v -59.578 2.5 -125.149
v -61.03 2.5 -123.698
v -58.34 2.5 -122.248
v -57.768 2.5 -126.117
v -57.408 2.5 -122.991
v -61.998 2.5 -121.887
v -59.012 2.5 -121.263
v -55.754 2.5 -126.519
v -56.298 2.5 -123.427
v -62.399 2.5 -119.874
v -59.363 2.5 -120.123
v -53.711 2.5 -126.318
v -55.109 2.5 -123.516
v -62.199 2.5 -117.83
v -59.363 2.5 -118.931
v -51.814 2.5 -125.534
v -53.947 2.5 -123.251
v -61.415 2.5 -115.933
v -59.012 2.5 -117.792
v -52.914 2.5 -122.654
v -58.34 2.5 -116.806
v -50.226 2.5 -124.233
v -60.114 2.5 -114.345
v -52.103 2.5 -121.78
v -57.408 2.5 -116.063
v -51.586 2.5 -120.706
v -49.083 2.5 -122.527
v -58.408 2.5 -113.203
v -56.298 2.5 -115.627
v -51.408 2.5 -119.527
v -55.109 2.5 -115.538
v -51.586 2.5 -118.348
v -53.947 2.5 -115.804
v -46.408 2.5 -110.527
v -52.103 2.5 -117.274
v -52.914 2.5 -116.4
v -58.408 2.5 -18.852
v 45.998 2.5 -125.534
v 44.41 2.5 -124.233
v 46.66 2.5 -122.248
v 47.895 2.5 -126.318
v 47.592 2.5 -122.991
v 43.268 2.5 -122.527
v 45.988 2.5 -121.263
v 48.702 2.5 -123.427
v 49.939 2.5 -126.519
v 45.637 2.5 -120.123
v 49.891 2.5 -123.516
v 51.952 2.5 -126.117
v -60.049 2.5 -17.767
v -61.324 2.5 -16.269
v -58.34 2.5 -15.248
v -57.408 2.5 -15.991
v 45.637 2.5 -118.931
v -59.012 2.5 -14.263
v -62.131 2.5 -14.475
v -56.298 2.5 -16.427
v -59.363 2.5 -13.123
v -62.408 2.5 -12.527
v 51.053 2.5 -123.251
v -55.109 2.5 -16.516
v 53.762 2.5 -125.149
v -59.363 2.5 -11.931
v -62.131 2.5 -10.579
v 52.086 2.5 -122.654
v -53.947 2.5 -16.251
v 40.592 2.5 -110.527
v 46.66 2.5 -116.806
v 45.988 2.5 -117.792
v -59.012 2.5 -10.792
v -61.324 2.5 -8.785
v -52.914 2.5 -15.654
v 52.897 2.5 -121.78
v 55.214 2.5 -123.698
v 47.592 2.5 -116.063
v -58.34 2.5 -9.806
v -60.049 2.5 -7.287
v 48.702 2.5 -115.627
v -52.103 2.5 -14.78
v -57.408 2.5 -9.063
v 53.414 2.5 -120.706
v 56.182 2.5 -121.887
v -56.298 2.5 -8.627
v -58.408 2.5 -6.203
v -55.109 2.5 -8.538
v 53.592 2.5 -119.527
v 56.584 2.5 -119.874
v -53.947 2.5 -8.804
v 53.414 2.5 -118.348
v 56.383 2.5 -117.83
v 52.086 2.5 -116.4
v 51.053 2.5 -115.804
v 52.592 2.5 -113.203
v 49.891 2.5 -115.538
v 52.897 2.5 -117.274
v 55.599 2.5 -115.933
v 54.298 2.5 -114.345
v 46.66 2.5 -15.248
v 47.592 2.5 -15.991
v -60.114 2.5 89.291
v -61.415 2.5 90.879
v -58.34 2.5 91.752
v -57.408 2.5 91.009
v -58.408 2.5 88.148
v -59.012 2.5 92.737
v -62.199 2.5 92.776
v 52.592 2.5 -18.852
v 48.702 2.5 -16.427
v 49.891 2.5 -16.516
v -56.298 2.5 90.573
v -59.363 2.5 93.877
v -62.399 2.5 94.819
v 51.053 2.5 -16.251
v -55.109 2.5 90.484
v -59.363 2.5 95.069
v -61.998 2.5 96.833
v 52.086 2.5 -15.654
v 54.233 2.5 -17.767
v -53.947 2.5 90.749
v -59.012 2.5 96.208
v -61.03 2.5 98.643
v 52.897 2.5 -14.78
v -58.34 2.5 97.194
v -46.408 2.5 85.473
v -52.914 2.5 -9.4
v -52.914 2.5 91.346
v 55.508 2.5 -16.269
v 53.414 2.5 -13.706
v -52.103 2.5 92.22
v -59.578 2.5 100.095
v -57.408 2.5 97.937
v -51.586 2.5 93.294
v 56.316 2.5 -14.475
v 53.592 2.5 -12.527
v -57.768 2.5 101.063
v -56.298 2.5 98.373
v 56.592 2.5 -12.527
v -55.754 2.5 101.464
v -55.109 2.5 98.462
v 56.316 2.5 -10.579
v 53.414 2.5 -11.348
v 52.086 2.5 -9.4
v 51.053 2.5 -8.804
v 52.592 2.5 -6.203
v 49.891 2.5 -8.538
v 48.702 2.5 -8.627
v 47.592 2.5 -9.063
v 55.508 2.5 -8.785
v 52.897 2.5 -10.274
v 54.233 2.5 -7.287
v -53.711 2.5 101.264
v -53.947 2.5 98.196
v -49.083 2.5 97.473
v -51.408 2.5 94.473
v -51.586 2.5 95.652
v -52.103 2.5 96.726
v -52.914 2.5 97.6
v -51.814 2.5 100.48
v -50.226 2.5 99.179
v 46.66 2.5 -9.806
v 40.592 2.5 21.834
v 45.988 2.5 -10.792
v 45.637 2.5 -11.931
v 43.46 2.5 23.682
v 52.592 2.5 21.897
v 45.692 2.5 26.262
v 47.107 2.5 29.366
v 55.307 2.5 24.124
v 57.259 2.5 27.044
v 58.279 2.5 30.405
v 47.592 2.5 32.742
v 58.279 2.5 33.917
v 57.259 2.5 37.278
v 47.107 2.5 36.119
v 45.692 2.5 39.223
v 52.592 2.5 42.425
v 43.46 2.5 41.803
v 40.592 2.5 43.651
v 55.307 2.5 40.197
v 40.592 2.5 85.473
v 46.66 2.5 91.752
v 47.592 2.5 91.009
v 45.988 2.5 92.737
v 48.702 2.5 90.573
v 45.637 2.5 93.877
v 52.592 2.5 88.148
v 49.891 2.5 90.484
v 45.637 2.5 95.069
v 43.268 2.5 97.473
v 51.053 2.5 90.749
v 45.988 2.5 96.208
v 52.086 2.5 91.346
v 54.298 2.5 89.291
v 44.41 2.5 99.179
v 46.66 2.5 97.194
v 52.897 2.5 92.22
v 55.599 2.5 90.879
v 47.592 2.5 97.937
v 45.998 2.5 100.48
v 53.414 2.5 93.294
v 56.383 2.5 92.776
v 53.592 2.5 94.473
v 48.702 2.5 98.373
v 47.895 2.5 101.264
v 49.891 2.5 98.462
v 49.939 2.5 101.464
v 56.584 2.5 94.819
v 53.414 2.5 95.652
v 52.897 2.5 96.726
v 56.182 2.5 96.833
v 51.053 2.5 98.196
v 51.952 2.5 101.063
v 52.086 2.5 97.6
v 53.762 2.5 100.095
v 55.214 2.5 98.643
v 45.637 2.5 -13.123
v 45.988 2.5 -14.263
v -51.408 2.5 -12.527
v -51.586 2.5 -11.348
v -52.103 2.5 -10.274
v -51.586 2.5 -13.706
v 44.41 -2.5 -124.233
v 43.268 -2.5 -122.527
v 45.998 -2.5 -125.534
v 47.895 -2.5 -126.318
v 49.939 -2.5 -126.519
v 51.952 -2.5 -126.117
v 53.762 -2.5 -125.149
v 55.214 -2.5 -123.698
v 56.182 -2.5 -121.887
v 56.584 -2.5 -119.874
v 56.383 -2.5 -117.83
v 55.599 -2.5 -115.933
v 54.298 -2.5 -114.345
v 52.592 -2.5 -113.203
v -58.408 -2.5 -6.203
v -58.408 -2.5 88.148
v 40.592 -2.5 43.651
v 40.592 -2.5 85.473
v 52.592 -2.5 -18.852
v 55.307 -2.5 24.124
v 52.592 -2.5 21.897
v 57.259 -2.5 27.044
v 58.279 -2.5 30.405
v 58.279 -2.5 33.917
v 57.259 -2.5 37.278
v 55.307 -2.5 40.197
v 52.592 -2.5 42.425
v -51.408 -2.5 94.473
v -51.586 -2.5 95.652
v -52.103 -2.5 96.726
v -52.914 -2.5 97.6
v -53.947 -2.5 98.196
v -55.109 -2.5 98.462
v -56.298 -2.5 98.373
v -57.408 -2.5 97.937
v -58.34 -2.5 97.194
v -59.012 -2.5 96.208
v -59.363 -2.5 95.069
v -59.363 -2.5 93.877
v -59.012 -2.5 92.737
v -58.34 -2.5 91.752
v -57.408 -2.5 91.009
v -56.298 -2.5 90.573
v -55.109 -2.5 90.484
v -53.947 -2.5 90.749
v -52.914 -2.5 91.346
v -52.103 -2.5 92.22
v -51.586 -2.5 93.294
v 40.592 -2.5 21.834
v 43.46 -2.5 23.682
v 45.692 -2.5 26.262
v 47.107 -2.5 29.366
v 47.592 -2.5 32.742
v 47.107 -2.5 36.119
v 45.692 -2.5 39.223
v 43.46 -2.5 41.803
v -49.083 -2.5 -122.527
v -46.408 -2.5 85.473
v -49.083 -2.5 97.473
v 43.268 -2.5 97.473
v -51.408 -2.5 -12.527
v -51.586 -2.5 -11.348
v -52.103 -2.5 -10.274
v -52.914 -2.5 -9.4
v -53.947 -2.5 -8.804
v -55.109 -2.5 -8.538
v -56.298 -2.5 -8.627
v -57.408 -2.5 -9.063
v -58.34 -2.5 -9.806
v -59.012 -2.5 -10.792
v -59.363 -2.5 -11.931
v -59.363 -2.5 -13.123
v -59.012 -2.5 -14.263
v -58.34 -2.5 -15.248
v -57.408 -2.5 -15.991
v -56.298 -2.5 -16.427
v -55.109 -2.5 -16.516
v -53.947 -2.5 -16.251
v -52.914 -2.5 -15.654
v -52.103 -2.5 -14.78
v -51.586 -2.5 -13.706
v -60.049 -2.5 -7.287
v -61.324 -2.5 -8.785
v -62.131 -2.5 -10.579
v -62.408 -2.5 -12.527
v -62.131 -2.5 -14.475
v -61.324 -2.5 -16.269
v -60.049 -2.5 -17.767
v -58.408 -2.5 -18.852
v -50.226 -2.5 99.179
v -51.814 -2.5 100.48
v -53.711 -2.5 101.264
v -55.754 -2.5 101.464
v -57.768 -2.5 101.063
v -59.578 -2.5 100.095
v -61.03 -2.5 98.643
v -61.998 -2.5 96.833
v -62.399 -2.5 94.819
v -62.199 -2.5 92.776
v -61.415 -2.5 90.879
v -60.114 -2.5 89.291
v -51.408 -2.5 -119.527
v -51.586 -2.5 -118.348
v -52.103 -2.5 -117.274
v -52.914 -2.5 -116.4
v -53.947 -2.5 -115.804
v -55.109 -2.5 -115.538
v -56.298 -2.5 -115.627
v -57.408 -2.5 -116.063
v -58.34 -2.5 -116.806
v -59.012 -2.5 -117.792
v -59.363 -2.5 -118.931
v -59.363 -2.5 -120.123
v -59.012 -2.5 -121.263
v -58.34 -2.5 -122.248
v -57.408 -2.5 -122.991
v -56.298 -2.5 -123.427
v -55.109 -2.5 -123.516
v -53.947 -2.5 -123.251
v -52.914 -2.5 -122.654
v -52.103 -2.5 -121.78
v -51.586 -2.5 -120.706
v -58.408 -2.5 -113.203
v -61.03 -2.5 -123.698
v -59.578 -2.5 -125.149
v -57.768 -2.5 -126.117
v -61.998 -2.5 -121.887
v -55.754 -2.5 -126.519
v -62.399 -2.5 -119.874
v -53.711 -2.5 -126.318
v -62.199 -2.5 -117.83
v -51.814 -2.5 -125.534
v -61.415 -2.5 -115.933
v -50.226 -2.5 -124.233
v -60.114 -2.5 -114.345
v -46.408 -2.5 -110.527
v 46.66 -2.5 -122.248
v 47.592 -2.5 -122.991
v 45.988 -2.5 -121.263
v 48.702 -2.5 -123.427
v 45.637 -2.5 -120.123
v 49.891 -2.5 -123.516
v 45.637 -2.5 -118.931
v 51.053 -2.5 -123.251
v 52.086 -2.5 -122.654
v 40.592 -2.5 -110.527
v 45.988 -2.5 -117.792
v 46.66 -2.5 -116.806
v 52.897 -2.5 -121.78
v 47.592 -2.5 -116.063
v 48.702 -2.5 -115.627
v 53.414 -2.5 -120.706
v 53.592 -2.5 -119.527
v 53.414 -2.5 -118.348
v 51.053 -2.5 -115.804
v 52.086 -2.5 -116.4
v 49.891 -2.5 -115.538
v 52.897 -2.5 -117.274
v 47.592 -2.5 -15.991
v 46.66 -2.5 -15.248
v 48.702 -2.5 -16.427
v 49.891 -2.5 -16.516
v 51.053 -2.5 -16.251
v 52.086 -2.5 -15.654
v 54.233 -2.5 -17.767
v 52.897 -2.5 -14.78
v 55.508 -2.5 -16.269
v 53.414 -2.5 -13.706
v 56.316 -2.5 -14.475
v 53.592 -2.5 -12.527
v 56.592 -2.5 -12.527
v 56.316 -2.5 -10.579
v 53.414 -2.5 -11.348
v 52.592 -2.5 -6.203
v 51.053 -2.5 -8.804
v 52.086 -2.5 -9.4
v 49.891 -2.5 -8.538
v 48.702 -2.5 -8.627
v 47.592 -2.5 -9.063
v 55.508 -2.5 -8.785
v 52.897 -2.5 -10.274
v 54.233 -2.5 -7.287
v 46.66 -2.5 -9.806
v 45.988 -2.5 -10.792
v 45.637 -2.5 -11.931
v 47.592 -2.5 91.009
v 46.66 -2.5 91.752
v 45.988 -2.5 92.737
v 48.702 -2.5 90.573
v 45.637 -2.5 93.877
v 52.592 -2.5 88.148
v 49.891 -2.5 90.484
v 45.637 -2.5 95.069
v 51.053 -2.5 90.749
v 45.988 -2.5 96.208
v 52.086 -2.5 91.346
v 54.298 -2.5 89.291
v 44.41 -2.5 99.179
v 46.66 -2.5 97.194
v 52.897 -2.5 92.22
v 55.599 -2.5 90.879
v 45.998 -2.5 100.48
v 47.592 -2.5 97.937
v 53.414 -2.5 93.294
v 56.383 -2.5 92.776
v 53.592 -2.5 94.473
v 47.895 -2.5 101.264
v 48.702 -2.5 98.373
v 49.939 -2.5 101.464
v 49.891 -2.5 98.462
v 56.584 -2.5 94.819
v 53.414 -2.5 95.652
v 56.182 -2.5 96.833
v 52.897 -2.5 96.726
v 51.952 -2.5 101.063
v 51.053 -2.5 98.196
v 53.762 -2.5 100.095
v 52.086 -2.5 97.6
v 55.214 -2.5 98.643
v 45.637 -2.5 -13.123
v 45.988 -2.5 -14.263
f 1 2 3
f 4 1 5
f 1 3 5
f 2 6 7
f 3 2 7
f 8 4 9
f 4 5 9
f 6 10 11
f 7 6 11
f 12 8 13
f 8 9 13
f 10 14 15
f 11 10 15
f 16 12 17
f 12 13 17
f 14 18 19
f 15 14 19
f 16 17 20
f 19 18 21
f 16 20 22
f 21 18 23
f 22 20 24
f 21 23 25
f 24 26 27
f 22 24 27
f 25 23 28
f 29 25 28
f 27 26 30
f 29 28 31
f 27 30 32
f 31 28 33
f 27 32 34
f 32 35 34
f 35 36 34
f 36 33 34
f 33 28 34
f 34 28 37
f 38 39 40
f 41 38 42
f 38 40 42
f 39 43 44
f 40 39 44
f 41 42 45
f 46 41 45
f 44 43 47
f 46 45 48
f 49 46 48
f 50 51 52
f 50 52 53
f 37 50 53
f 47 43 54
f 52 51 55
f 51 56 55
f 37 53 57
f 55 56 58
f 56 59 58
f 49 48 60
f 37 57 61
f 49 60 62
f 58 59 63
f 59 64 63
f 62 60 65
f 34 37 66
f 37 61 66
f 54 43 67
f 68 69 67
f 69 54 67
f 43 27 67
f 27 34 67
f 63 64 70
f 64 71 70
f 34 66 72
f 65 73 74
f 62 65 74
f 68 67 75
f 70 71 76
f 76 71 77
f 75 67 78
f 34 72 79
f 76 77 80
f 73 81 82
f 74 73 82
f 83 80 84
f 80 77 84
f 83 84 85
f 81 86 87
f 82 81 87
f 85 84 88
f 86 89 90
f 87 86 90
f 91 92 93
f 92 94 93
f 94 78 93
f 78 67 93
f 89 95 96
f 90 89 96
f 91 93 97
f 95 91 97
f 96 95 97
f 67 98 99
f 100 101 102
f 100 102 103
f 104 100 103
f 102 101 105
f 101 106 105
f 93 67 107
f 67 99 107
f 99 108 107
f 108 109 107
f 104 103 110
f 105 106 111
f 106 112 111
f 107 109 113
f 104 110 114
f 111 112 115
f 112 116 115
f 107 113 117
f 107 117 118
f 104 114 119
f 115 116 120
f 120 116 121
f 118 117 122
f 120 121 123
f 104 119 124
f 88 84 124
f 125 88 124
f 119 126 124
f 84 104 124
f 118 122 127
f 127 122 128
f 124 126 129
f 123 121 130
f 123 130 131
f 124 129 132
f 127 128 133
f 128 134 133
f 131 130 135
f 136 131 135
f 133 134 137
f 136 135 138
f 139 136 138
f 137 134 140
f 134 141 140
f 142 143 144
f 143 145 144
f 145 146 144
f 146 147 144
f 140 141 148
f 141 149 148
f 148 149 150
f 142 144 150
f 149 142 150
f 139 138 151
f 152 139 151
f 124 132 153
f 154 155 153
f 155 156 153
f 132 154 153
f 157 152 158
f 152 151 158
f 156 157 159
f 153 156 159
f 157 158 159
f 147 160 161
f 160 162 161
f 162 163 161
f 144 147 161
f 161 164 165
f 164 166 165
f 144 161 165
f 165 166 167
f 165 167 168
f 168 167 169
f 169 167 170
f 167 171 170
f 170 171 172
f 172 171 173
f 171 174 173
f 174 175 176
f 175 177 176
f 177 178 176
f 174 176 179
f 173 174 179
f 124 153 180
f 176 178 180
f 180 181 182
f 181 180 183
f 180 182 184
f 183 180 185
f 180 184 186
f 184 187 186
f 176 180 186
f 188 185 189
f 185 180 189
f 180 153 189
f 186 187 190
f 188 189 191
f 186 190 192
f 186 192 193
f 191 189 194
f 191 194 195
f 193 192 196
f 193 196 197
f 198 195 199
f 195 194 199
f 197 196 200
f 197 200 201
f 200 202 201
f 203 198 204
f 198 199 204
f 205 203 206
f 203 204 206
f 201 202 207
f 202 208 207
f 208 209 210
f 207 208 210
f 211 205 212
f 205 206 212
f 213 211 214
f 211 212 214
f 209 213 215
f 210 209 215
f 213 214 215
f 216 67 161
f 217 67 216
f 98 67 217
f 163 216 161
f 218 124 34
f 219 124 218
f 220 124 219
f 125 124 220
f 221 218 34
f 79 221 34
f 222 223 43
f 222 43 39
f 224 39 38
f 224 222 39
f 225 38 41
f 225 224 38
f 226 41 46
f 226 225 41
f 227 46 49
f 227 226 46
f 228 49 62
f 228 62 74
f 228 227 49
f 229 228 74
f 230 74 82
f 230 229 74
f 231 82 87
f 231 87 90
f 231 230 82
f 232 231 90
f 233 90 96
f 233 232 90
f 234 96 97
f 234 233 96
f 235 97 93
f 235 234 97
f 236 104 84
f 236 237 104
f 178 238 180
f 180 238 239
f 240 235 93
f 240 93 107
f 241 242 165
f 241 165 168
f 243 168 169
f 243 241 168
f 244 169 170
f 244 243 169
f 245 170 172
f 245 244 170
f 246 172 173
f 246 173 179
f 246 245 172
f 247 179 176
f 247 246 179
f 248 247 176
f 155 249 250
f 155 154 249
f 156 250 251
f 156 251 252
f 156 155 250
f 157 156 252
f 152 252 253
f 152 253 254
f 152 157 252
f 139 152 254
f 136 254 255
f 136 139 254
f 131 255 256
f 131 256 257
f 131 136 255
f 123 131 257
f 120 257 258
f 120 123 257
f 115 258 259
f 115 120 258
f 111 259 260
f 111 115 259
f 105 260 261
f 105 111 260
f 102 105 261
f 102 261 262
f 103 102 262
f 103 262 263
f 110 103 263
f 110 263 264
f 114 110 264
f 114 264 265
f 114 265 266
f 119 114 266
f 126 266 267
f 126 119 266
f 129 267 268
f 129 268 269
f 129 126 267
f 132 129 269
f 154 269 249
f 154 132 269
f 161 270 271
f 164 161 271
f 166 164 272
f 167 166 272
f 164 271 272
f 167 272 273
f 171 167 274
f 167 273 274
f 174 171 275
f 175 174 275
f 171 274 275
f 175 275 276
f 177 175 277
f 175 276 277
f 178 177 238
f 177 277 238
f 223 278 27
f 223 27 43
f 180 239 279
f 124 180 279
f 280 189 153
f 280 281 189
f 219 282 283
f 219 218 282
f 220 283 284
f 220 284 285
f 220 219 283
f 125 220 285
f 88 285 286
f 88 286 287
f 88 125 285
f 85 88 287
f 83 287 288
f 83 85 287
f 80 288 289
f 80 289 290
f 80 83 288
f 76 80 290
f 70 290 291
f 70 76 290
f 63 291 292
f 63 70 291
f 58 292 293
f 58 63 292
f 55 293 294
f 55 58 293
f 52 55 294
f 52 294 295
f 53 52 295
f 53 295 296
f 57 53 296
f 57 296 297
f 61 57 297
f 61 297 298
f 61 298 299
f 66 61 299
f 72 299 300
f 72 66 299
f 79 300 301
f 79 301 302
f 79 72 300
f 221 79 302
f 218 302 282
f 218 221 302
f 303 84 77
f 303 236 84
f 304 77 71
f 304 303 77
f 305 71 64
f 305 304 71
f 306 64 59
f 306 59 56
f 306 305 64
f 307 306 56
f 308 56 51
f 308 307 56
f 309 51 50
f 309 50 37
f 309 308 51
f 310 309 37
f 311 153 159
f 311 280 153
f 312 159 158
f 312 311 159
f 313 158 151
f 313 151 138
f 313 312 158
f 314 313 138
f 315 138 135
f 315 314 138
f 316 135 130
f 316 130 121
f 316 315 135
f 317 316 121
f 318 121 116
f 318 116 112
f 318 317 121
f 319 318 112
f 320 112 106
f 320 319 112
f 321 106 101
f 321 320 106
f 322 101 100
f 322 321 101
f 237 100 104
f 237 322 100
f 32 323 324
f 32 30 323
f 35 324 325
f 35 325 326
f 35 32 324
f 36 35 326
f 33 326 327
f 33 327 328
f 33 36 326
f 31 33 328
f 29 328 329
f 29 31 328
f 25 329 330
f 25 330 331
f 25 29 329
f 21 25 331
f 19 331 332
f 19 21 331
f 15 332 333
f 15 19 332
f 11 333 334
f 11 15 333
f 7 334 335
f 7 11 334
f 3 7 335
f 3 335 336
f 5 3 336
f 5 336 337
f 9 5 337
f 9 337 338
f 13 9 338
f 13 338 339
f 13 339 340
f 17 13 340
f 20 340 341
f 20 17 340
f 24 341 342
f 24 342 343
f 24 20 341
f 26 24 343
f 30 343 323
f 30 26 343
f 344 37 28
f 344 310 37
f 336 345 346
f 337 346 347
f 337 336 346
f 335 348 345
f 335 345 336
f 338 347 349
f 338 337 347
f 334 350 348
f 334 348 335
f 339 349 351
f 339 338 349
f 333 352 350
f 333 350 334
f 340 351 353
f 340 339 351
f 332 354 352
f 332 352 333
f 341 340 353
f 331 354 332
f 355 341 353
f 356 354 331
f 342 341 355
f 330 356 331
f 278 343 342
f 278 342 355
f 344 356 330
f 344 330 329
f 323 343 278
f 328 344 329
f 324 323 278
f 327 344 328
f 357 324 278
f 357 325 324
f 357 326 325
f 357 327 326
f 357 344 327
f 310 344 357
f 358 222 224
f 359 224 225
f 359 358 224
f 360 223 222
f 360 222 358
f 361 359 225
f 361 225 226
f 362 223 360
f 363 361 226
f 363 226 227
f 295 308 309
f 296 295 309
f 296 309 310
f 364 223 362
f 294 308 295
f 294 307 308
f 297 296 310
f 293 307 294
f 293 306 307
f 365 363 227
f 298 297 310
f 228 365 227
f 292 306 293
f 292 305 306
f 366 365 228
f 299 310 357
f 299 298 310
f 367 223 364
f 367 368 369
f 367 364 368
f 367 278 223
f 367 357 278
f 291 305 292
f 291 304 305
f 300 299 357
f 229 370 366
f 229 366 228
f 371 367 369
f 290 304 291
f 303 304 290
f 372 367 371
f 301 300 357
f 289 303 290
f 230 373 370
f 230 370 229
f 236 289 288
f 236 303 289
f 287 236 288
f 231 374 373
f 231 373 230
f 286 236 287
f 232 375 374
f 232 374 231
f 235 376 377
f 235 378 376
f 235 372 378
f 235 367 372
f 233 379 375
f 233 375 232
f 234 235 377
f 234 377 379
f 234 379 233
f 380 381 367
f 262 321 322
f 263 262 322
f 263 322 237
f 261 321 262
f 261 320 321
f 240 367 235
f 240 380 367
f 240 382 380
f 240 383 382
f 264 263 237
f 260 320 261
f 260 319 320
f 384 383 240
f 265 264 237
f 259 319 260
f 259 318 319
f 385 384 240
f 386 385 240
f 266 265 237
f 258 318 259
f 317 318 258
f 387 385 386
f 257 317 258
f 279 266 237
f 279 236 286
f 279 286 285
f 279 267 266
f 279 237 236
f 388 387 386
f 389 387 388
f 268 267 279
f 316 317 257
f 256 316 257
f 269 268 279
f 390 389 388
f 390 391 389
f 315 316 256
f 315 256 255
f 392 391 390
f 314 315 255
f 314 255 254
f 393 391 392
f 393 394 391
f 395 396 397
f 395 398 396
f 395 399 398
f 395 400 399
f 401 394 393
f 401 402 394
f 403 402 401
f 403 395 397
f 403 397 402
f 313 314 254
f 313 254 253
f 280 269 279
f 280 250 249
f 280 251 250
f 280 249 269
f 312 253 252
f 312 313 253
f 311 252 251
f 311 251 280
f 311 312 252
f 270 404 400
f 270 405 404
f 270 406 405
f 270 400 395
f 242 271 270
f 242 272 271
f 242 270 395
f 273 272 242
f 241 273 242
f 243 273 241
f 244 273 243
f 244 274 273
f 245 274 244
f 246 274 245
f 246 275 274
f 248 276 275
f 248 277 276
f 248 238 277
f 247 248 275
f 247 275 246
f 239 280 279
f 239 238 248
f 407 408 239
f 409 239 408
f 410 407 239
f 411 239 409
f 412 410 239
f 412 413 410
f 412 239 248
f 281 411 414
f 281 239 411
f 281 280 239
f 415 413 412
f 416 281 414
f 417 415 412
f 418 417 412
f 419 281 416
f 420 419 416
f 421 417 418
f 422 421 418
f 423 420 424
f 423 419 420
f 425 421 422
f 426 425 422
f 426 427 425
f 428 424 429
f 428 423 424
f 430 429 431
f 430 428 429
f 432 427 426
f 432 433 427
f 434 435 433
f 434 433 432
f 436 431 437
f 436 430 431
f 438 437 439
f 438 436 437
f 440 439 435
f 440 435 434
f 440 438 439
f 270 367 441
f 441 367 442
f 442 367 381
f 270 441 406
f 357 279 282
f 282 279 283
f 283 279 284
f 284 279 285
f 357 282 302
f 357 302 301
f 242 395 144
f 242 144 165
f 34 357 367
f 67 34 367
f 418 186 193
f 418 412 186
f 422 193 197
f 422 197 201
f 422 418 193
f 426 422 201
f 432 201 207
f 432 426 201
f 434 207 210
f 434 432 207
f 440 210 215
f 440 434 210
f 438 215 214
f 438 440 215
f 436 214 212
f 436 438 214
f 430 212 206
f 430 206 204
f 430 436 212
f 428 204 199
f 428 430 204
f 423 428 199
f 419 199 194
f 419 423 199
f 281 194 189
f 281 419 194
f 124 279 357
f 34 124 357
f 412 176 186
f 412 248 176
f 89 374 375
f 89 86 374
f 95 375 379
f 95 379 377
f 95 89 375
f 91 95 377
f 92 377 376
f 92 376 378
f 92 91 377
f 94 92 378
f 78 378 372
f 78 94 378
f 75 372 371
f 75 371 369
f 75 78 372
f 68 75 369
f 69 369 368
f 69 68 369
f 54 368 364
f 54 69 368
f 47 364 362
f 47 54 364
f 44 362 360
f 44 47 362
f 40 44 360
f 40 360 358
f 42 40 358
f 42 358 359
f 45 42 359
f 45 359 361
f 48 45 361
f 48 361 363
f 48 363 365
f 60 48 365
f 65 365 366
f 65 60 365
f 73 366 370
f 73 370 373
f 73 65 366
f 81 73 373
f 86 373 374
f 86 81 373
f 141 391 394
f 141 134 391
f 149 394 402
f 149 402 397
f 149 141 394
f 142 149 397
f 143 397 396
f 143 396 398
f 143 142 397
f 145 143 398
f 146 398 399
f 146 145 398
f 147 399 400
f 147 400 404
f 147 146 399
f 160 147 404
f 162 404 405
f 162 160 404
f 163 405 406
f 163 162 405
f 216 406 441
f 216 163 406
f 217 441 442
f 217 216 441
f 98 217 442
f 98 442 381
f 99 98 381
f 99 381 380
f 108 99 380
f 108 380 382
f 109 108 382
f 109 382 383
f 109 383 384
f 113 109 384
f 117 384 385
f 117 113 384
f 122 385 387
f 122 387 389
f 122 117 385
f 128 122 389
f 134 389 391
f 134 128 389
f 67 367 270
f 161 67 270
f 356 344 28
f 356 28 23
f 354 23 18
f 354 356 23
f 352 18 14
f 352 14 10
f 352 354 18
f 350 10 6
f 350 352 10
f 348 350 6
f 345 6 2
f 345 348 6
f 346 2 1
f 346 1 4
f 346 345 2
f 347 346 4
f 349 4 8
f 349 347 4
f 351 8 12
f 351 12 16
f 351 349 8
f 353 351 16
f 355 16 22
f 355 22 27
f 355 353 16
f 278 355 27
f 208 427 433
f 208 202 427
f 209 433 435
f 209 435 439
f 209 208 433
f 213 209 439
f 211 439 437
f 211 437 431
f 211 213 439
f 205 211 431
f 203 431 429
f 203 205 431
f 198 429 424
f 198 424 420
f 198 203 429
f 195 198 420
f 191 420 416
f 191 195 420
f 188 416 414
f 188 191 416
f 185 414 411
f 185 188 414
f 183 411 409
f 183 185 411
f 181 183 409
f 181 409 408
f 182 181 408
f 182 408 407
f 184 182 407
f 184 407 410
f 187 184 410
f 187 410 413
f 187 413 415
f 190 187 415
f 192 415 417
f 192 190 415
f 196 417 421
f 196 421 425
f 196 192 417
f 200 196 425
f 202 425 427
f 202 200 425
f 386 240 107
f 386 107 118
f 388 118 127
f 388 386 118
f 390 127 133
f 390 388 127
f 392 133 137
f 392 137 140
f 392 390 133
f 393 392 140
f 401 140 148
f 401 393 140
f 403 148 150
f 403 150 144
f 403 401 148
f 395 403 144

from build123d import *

# Parameters (mm, degrees)
F0_R     = 4
F1_DEPTH = 2.5
F3_DEPTH = 5


# Not quite as in the source:
# - a feature names something its author has since deleted; it is built from what else it names


with BuildPart() as f1:
    # F0 (on Front) → F1 (new body, symmetric)
    with BuildSketch(Plane.XZ):
        with BuildLine():
            Line((-58.4079127312, -18.8516896643), (-58.4079127312, -113.2025790236))
            ThreePointArc((-58.4079127312, -113.2025790236), (-60.3576601995, -124.4768818123), (-49.0833574108, -122.527134344))
            Line((-49.0833574108, -122.527134344), (43.2675319485, -122.527134344))
            ThreePointArc((43.2675319485, -122.527134344), (54.5418347371, -124.4768818123), (52.5920872688, -113.2025790236))
            Line((52.5920872688, -113.2025790236), (52.5920872688, -18.8516896643))
            ThreePointArc((52.5920872688, -18.8516896643), (56.5920872688, -12.527134344), (52.5920872688, -6.2025790236))
            Line((52.5920872688, -6.2025790236), (52.5920872688, 21.8966218341))
            ThreePointArc((52.5920872688, 21.8966218341), (58.408131243, 32.1608112925), (52.5920872688, 42.425000751))
            Line((52.5920872688, 42.425000751), (52.5920872688, 88.1483103357))
            ThreePointArc((52.5920872688, 88.1483103357), (54.5418347371, 99.4226131243), (43.2675319485, 97.472865656))
            Line((43.2675319485, 97.472865656), (-49.0833574108, 97.472865656))
            ThreePointArc((-49.0833574108, 97.472865656), (-60.3576601995, 99.4226131243), (-58.4079127312, 88.1483103357))
            Line((-58.4079127312, 88.1483103357), (-58.4079127312, -6.2025790236))
            ThreePointArc((-58.4079127312, -6.2025790236), (-62.4079127312, -12.527134344), (-58.4079127312, -18.8516896643))
        make_face()
        with Locations((-55.4079127312, -119.527134344)):
            Circle(F0_R, mode=Mode.SUBTRACT)
        with Locations((49.5920872688, -119.527134344)):
            Circle(F0_R, mode=Mode.SUBTRACT)
        with Locations((-55.4079127312, -12.527134344)):
            Circle(F0_R, mode=Mode.SUBTRACT)
        with Locations((-55.4079127312, 94.472865656)):
            Circle(F0_R, mode=Mode.SUBTRACT)
        with Locations((49.5920872688, -12.527134344)):
            Circle(F0_R, mode=Mode.SUBTRACT)
        with Locations((49.5920872688, 94.472865656)):
            Circle(F0_R, mode=Mode.SUBTRACT)
    extrude(amount=F1_DEPTH, both=True)

    # F2 (on Front) → F3 (cut, symmetric)
    with BuildSketch(Plane.XZ):
        with BuildLine():
            Line((40.5920872688, 85.472865656), (-46.4079127312, 85.472865656))
            Line((-46.4079127312, 85.472865656), (-46.4079127312, -110.527134344))
            Line((-46.4079127312, -110.527134344), (40.5920872688, -110.527134344))
            Line((40.5920872688, -110.527134344), (40.5920872688, 21.8337872246))
            ThreePointArc((40.5920872688, 21.8337872246), (47.5920872688, 32.7424993392), (40.5920872688, 43.6512114539))
            Line((40.5920872688, 43.6512114539), (40.5920872688, 85.472865656))
        make_face()
    extrude(amount=F3_DEPTH, both=True, mode=Mode.SUBTRACT)


solid = f1.part
